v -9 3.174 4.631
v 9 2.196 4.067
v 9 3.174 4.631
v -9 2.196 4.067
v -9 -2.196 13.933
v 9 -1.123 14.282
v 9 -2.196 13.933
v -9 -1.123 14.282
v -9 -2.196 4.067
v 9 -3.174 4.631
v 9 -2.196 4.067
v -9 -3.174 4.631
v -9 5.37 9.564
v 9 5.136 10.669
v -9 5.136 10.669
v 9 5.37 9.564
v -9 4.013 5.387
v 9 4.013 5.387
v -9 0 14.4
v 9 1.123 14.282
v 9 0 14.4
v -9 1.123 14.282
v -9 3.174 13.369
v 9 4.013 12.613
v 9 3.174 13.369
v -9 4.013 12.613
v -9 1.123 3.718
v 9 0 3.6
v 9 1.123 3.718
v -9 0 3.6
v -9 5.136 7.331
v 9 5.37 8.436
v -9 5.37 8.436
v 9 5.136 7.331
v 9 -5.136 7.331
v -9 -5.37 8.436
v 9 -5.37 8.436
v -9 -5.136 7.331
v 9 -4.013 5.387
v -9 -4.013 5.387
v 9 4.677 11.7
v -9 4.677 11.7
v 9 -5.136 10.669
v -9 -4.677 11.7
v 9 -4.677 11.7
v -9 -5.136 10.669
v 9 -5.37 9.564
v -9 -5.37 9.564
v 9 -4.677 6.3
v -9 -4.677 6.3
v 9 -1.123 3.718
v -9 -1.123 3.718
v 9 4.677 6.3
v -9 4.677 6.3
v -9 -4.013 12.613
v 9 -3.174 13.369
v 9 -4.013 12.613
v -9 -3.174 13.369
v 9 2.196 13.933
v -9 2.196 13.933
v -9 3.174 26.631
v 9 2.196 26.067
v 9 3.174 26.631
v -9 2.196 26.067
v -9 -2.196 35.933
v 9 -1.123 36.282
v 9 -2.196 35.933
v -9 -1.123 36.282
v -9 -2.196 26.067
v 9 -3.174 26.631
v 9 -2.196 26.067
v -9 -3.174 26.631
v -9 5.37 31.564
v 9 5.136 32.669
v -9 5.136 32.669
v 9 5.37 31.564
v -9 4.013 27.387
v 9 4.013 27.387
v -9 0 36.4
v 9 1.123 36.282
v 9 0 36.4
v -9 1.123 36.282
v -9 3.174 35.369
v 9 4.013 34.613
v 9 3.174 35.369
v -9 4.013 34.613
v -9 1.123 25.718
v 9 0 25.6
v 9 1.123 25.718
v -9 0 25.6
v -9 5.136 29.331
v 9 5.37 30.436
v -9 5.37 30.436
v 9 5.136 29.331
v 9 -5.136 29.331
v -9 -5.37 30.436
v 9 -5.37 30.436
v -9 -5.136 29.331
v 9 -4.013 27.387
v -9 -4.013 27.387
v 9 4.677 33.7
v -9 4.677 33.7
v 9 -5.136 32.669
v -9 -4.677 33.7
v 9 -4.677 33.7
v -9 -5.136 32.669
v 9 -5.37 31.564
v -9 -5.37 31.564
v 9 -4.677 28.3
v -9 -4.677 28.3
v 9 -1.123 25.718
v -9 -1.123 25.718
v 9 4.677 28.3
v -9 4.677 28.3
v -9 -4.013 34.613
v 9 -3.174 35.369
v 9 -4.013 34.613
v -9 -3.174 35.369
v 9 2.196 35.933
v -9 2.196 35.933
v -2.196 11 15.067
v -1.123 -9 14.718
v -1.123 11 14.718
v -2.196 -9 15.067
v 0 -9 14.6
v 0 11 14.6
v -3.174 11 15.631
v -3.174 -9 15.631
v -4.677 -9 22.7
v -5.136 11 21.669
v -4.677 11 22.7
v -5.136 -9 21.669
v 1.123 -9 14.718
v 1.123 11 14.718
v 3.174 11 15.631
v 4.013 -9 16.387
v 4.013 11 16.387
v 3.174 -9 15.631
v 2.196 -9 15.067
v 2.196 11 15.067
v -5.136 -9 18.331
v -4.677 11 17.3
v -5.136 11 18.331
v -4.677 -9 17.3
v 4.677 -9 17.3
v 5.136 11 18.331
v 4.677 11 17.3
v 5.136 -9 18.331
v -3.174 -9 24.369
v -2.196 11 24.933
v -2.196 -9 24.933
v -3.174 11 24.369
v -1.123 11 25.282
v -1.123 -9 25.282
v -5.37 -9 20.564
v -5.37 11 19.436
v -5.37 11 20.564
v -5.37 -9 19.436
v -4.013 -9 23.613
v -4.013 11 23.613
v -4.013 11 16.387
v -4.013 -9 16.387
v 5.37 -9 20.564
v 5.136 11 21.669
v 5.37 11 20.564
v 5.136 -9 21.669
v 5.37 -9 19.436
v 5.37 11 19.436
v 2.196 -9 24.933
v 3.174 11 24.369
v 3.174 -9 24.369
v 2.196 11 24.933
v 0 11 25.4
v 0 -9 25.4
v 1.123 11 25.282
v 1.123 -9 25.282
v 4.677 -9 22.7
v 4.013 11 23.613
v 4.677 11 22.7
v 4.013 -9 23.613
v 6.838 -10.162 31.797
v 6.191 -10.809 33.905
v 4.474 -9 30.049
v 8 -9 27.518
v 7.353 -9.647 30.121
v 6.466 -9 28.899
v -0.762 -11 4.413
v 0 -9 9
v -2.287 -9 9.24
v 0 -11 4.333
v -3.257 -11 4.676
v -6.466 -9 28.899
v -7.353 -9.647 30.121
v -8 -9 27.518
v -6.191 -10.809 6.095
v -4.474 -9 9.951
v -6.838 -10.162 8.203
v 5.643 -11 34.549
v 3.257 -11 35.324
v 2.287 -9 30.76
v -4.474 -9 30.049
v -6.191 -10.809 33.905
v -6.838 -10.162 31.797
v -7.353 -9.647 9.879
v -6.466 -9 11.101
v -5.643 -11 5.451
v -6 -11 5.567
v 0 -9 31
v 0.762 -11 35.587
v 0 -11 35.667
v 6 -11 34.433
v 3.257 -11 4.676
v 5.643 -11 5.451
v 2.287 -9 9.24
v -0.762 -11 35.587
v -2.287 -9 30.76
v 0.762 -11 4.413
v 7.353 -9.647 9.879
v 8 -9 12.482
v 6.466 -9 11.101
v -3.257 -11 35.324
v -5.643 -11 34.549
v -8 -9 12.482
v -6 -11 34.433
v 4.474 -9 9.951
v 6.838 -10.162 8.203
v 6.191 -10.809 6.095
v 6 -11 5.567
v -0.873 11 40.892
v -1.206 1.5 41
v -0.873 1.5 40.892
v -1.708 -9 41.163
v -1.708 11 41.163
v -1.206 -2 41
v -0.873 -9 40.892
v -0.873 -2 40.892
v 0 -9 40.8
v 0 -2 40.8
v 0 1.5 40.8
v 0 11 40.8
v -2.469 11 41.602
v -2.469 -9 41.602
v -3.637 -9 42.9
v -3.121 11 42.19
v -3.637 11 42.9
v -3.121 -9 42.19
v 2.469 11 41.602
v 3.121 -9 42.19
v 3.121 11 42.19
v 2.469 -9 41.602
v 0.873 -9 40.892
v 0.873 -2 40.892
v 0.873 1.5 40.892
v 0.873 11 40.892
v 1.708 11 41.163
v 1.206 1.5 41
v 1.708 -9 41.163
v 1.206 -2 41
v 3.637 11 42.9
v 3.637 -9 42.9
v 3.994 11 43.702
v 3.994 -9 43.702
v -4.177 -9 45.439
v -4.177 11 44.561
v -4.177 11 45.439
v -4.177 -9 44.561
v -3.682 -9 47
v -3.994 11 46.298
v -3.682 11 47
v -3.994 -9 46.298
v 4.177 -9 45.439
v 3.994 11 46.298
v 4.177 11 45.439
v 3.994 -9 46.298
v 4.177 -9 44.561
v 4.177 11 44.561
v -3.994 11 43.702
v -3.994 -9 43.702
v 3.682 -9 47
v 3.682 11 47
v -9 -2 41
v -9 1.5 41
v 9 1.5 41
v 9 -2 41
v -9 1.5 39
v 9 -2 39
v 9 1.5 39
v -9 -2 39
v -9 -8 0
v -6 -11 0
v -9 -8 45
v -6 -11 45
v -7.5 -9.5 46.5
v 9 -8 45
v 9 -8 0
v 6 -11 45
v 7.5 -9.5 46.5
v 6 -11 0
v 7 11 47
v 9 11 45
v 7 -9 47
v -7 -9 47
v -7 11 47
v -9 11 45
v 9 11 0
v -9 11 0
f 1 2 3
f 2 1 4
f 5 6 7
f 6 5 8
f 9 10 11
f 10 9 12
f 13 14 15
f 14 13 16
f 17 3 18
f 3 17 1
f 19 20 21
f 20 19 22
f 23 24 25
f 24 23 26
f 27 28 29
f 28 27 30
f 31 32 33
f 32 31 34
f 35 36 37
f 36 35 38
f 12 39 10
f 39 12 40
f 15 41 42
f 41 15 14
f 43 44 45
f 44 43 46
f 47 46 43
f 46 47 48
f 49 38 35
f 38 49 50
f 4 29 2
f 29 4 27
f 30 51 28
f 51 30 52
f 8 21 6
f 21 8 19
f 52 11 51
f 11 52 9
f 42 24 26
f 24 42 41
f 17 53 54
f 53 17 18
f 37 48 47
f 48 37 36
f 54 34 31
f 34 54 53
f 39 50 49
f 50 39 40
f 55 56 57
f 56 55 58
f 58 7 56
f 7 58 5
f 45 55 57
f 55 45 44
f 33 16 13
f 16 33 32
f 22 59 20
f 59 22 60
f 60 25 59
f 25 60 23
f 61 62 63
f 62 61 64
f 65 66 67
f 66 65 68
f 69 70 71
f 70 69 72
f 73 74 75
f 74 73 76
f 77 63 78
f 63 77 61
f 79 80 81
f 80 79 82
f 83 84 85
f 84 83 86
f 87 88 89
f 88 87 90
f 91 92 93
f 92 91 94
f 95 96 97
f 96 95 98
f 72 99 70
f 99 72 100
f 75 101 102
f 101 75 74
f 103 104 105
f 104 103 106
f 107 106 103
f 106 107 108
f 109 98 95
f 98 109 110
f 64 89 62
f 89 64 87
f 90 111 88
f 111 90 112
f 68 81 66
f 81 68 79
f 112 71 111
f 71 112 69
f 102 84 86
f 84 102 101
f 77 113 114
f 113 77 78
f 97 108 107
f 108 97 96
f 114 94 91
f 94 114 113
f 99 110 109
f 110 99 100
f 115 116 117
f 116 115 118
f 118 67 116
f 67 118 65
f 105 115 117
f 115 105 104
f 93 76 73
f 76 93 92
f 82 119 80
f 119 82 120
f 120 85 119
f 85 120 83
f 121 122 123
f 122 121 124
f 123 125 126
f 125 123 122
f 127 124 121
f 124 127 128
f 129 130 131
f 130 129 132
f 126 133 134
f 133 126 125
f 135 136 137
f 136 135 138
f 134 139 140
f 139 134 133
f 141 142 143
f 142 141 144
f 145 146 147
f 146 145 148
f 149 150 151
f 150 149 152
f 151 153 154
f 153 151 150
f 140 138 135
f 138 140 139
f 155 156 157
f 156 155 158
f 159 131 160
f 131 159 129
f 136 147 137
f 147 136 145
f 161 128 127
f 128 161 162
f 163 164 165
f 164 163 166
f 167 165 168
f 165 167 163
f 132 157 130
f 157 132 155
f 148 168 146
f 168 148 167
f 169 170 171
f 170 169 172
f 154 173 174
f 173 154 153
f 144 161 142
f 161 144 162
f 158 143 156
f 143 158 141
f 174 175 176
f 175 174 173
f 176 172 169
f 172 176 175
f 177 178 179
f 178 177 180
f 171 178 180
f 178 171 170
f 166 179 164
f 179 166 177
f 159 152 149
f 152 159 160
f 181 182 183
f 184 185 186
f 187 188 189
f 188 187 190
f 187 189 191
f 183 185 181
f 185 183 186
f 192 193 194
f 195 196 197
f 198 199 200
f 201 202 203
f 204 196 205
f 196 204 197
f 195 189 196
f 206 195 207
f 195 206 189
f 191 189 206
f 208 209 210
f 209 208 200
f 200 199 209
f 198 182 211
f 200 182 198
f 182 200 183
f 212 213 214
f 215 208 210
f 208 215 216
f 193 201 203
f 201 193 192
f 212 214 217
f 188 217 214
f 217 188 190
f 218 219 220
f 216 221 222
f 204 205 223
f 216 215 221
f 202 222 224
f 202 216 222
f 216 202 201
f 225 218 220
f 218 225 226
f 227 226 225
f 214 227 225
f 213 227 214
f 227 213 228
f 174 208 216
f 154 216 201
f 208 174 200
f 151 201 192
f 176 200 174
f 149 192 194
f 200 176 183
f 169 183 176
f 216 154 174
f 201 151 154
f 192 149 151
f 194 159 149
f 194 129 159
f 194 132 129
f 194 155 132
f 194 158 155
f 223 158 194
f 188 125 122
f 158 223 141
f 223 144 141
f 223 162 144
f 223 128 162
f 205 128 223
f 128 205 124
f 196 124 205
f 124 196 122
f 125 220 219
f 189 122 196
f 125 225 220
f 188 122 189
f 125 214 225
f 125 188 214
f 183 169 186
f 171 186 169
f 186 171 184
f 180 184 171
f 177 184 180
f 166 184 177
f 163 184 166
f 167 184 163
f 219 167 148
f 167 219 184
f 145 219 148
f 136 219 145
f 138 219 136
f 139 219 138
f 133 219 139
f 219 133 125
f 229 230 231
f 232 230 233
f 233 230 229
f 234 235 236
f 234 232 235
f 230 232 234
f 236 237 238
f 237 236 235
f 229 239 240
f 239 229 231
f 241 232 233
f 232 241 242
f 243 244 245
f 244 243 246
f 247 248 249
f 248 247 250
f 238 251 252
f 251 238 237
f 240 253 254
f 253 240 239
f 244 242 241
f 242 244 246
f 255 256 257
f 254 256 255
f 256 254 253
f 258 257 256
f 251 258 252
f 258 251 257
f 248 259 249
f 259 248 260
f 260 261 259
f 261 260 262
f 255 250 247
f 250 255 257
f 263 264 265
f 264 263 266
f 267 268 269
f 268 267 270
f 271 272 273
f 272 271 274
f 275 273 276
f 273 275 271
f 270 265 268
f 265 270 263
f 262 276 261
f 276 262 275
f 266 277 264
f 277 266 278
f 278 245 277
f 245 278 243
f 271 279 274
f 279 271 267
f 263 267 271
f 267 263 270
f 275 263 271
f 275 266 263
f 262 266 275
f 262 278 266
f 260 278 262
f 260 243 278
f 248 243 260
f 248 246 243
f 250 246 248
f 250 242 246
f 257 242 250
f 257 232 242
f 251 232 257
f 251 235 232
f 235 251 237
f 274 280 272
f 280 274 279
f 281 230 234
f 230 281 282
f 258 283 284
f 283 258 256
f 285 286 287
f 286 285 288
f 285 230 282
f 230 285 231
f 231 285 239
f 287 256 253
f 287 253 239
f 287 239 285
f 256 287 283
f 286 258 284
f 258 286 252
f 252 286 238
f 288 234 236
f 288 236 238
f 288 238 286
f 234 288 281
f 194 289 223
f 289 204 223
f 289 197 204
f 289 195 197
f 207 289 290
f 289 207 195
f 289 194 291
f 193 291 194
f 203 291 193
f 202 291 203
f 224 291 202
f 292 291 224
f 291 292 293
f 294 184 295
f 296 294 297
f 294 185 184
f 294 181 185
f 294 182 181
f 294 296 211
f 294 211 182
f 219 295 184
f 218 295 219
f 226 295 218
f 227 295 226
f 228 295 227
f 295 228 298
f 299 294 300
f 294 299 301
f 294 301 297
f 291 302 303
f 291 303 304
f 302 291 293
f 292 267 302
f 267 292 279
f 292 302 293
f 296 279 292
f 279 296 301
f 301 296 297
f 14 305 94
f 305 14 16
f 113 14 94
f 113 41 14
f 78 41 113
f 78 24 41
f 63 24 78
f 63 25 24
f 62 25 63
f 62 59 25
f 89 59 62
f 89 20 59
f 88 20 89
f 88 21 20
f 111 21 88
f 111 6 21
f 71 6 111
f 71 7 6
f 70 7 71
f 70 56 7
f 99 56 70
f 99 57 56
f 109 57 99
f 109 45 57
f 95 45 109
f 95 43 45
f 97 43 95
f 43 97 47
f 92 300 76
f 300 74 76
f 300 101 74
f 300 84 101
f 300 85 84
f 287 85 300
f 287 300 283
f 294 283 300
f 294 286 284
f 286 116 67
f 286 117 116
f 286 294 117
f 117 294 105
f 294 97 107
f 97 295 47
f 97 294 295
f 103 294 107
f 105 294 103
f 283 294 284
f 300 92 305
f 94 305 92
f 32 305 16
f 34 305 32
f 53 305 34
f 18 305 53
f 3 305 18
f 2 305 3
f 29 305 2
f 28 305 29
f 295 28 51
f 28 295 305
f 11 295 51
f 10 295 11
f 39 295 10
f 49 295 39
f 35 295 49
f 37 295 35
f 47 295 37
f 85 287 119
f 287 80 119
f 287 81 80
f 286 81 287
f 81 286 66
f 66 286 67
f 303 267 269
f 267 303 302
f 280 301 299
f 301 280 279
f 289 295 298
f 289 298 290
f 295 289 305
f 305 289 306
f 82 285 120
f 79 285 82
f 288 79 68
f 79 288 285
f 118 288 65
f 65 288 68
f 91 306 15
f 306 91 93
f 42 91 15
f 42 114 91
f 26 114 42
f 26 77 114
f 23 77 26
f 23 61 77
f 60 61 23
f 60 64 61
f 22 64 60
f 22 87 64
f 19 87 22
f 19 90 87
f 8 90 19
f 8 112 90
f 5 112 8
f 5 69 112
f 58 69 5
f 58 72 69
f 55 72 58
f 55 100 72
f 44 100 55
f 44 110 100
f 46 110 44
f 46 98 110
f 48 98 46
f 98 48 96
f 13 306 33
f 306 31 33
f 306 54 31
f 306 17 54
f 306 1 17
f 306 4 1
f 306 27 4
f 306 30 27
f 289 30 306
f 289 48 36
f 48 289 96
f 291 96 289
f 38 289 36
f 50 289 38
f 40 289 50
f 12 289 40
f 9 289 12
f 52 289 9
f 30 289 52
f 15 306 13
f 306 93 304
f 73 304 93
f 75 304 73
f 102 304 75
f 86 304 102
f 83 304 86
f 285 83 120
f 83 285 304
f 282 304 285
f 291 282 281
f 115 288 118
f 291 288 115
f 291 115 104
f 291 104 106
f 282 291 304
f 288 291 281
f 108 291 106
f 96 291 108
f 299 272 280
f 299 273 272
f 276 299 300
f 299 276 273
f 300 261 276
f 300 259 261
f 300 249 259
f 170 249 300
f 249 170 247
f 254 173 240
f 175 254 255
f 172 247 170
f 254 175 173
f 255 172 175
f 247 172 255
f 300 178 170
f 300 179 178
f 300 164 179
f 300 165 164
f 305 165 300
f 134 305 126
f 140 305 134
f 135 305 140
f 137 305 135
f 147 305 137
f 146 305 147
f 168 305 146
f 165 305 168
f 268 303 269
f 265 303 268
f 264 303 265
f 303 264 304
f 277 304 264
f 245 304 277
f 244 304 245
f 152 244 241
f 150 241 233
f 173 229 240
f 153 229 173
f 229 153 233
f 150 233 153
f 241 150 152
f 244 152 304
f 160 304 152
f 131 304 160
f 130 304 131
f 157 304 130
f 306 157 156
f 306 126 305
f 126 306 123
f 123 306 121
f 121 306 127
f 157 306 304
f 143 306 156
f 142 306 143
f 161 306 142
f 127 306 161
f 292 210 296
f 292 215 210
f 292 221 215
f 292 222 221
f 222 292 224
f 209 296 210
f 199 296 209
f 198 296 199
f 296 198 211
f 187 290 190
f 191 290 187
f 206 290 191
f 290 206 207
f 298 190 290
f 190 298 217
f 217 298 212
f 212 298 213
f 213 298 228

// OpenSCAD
// PRUSA iteration3
// Y frame corners
// GNU GPL v3
// Josef Průša <iam@josefprusa.cz> and contributors
// http://www.reprap.org/wiki/Prusa_Mendel
// http://prusamendel.org


module corner_base(){	
 translate([-9,-11,0])cube([18,22,47]);
}

module corner_holes(){
 translate([-11,-11,0]){
  // Bottom hole
  translate([0,11,10-1]) rotate([0,90,0]) translate([0,0,-5]) cylinder(h = 270, r=5.4, $fn=30);
  // Top hole
  translate([0,11,30+1]) rotate([0,90,0]) translate([0,0,-5]) cylinder(h = 270, r=5.4, $fn=30);
  // Middle hole
  translate([11,0,20]) rotate([0,0,90]) rotate([0,90,0]) translate([0,0,-5]) cylinder(h = 270, r=5.4, $fn=30);

  // Washer hole
  translate([11,-3+7,20]) rotate([0,0,90]) rotate([0,90,0]) translate([0,0,-5]) cylinder(h = 3, r1=18, r2=11, $fn=30);

  // Top smooth rod insert
  // Smooth rod place
  translate([11,2,45]) rotate([0,90,90]) cylinder(h = 270, r=4.2, $fn=30); 
  // Ziptie
  translate([-5,9,39])  cube([30,3.5,2]);
 }
}

module corner_fancy(){
 // Side corner cutouts
  translate([-8,-9,0]) rotate([0,0,-45-180]) translate([-15,0,-1]) cube([30,30,51]);
  translate([8,-9,0]) rotate([0,0,45-180]) translate([-15,0,-1]) cube([30,30,51]);
 // Top corner cutouts
  translate([7,0,49-2]) rotate([0,45,0]) translate([-15,-15,0]) cube([30,30,30]);
  translate([-7,0,49-2]) rotate([0,-45,0]) translate([-15,-15,0]) cube([30,30,30]);
  rotate([0,0,90]){
   translate([-9,0,49-2]) rotate([0,-45,0]) translate([-15,-15,0]) cube([30,30,30]);
  }
}


// Final part
module corner(){
 // Rotate the part for better printing
 translate([0,0,0]) rotate([0,0,0]) difference(){
  corner_base();
  corner_holes();
  corner_fancy();
 }
}

corner();
